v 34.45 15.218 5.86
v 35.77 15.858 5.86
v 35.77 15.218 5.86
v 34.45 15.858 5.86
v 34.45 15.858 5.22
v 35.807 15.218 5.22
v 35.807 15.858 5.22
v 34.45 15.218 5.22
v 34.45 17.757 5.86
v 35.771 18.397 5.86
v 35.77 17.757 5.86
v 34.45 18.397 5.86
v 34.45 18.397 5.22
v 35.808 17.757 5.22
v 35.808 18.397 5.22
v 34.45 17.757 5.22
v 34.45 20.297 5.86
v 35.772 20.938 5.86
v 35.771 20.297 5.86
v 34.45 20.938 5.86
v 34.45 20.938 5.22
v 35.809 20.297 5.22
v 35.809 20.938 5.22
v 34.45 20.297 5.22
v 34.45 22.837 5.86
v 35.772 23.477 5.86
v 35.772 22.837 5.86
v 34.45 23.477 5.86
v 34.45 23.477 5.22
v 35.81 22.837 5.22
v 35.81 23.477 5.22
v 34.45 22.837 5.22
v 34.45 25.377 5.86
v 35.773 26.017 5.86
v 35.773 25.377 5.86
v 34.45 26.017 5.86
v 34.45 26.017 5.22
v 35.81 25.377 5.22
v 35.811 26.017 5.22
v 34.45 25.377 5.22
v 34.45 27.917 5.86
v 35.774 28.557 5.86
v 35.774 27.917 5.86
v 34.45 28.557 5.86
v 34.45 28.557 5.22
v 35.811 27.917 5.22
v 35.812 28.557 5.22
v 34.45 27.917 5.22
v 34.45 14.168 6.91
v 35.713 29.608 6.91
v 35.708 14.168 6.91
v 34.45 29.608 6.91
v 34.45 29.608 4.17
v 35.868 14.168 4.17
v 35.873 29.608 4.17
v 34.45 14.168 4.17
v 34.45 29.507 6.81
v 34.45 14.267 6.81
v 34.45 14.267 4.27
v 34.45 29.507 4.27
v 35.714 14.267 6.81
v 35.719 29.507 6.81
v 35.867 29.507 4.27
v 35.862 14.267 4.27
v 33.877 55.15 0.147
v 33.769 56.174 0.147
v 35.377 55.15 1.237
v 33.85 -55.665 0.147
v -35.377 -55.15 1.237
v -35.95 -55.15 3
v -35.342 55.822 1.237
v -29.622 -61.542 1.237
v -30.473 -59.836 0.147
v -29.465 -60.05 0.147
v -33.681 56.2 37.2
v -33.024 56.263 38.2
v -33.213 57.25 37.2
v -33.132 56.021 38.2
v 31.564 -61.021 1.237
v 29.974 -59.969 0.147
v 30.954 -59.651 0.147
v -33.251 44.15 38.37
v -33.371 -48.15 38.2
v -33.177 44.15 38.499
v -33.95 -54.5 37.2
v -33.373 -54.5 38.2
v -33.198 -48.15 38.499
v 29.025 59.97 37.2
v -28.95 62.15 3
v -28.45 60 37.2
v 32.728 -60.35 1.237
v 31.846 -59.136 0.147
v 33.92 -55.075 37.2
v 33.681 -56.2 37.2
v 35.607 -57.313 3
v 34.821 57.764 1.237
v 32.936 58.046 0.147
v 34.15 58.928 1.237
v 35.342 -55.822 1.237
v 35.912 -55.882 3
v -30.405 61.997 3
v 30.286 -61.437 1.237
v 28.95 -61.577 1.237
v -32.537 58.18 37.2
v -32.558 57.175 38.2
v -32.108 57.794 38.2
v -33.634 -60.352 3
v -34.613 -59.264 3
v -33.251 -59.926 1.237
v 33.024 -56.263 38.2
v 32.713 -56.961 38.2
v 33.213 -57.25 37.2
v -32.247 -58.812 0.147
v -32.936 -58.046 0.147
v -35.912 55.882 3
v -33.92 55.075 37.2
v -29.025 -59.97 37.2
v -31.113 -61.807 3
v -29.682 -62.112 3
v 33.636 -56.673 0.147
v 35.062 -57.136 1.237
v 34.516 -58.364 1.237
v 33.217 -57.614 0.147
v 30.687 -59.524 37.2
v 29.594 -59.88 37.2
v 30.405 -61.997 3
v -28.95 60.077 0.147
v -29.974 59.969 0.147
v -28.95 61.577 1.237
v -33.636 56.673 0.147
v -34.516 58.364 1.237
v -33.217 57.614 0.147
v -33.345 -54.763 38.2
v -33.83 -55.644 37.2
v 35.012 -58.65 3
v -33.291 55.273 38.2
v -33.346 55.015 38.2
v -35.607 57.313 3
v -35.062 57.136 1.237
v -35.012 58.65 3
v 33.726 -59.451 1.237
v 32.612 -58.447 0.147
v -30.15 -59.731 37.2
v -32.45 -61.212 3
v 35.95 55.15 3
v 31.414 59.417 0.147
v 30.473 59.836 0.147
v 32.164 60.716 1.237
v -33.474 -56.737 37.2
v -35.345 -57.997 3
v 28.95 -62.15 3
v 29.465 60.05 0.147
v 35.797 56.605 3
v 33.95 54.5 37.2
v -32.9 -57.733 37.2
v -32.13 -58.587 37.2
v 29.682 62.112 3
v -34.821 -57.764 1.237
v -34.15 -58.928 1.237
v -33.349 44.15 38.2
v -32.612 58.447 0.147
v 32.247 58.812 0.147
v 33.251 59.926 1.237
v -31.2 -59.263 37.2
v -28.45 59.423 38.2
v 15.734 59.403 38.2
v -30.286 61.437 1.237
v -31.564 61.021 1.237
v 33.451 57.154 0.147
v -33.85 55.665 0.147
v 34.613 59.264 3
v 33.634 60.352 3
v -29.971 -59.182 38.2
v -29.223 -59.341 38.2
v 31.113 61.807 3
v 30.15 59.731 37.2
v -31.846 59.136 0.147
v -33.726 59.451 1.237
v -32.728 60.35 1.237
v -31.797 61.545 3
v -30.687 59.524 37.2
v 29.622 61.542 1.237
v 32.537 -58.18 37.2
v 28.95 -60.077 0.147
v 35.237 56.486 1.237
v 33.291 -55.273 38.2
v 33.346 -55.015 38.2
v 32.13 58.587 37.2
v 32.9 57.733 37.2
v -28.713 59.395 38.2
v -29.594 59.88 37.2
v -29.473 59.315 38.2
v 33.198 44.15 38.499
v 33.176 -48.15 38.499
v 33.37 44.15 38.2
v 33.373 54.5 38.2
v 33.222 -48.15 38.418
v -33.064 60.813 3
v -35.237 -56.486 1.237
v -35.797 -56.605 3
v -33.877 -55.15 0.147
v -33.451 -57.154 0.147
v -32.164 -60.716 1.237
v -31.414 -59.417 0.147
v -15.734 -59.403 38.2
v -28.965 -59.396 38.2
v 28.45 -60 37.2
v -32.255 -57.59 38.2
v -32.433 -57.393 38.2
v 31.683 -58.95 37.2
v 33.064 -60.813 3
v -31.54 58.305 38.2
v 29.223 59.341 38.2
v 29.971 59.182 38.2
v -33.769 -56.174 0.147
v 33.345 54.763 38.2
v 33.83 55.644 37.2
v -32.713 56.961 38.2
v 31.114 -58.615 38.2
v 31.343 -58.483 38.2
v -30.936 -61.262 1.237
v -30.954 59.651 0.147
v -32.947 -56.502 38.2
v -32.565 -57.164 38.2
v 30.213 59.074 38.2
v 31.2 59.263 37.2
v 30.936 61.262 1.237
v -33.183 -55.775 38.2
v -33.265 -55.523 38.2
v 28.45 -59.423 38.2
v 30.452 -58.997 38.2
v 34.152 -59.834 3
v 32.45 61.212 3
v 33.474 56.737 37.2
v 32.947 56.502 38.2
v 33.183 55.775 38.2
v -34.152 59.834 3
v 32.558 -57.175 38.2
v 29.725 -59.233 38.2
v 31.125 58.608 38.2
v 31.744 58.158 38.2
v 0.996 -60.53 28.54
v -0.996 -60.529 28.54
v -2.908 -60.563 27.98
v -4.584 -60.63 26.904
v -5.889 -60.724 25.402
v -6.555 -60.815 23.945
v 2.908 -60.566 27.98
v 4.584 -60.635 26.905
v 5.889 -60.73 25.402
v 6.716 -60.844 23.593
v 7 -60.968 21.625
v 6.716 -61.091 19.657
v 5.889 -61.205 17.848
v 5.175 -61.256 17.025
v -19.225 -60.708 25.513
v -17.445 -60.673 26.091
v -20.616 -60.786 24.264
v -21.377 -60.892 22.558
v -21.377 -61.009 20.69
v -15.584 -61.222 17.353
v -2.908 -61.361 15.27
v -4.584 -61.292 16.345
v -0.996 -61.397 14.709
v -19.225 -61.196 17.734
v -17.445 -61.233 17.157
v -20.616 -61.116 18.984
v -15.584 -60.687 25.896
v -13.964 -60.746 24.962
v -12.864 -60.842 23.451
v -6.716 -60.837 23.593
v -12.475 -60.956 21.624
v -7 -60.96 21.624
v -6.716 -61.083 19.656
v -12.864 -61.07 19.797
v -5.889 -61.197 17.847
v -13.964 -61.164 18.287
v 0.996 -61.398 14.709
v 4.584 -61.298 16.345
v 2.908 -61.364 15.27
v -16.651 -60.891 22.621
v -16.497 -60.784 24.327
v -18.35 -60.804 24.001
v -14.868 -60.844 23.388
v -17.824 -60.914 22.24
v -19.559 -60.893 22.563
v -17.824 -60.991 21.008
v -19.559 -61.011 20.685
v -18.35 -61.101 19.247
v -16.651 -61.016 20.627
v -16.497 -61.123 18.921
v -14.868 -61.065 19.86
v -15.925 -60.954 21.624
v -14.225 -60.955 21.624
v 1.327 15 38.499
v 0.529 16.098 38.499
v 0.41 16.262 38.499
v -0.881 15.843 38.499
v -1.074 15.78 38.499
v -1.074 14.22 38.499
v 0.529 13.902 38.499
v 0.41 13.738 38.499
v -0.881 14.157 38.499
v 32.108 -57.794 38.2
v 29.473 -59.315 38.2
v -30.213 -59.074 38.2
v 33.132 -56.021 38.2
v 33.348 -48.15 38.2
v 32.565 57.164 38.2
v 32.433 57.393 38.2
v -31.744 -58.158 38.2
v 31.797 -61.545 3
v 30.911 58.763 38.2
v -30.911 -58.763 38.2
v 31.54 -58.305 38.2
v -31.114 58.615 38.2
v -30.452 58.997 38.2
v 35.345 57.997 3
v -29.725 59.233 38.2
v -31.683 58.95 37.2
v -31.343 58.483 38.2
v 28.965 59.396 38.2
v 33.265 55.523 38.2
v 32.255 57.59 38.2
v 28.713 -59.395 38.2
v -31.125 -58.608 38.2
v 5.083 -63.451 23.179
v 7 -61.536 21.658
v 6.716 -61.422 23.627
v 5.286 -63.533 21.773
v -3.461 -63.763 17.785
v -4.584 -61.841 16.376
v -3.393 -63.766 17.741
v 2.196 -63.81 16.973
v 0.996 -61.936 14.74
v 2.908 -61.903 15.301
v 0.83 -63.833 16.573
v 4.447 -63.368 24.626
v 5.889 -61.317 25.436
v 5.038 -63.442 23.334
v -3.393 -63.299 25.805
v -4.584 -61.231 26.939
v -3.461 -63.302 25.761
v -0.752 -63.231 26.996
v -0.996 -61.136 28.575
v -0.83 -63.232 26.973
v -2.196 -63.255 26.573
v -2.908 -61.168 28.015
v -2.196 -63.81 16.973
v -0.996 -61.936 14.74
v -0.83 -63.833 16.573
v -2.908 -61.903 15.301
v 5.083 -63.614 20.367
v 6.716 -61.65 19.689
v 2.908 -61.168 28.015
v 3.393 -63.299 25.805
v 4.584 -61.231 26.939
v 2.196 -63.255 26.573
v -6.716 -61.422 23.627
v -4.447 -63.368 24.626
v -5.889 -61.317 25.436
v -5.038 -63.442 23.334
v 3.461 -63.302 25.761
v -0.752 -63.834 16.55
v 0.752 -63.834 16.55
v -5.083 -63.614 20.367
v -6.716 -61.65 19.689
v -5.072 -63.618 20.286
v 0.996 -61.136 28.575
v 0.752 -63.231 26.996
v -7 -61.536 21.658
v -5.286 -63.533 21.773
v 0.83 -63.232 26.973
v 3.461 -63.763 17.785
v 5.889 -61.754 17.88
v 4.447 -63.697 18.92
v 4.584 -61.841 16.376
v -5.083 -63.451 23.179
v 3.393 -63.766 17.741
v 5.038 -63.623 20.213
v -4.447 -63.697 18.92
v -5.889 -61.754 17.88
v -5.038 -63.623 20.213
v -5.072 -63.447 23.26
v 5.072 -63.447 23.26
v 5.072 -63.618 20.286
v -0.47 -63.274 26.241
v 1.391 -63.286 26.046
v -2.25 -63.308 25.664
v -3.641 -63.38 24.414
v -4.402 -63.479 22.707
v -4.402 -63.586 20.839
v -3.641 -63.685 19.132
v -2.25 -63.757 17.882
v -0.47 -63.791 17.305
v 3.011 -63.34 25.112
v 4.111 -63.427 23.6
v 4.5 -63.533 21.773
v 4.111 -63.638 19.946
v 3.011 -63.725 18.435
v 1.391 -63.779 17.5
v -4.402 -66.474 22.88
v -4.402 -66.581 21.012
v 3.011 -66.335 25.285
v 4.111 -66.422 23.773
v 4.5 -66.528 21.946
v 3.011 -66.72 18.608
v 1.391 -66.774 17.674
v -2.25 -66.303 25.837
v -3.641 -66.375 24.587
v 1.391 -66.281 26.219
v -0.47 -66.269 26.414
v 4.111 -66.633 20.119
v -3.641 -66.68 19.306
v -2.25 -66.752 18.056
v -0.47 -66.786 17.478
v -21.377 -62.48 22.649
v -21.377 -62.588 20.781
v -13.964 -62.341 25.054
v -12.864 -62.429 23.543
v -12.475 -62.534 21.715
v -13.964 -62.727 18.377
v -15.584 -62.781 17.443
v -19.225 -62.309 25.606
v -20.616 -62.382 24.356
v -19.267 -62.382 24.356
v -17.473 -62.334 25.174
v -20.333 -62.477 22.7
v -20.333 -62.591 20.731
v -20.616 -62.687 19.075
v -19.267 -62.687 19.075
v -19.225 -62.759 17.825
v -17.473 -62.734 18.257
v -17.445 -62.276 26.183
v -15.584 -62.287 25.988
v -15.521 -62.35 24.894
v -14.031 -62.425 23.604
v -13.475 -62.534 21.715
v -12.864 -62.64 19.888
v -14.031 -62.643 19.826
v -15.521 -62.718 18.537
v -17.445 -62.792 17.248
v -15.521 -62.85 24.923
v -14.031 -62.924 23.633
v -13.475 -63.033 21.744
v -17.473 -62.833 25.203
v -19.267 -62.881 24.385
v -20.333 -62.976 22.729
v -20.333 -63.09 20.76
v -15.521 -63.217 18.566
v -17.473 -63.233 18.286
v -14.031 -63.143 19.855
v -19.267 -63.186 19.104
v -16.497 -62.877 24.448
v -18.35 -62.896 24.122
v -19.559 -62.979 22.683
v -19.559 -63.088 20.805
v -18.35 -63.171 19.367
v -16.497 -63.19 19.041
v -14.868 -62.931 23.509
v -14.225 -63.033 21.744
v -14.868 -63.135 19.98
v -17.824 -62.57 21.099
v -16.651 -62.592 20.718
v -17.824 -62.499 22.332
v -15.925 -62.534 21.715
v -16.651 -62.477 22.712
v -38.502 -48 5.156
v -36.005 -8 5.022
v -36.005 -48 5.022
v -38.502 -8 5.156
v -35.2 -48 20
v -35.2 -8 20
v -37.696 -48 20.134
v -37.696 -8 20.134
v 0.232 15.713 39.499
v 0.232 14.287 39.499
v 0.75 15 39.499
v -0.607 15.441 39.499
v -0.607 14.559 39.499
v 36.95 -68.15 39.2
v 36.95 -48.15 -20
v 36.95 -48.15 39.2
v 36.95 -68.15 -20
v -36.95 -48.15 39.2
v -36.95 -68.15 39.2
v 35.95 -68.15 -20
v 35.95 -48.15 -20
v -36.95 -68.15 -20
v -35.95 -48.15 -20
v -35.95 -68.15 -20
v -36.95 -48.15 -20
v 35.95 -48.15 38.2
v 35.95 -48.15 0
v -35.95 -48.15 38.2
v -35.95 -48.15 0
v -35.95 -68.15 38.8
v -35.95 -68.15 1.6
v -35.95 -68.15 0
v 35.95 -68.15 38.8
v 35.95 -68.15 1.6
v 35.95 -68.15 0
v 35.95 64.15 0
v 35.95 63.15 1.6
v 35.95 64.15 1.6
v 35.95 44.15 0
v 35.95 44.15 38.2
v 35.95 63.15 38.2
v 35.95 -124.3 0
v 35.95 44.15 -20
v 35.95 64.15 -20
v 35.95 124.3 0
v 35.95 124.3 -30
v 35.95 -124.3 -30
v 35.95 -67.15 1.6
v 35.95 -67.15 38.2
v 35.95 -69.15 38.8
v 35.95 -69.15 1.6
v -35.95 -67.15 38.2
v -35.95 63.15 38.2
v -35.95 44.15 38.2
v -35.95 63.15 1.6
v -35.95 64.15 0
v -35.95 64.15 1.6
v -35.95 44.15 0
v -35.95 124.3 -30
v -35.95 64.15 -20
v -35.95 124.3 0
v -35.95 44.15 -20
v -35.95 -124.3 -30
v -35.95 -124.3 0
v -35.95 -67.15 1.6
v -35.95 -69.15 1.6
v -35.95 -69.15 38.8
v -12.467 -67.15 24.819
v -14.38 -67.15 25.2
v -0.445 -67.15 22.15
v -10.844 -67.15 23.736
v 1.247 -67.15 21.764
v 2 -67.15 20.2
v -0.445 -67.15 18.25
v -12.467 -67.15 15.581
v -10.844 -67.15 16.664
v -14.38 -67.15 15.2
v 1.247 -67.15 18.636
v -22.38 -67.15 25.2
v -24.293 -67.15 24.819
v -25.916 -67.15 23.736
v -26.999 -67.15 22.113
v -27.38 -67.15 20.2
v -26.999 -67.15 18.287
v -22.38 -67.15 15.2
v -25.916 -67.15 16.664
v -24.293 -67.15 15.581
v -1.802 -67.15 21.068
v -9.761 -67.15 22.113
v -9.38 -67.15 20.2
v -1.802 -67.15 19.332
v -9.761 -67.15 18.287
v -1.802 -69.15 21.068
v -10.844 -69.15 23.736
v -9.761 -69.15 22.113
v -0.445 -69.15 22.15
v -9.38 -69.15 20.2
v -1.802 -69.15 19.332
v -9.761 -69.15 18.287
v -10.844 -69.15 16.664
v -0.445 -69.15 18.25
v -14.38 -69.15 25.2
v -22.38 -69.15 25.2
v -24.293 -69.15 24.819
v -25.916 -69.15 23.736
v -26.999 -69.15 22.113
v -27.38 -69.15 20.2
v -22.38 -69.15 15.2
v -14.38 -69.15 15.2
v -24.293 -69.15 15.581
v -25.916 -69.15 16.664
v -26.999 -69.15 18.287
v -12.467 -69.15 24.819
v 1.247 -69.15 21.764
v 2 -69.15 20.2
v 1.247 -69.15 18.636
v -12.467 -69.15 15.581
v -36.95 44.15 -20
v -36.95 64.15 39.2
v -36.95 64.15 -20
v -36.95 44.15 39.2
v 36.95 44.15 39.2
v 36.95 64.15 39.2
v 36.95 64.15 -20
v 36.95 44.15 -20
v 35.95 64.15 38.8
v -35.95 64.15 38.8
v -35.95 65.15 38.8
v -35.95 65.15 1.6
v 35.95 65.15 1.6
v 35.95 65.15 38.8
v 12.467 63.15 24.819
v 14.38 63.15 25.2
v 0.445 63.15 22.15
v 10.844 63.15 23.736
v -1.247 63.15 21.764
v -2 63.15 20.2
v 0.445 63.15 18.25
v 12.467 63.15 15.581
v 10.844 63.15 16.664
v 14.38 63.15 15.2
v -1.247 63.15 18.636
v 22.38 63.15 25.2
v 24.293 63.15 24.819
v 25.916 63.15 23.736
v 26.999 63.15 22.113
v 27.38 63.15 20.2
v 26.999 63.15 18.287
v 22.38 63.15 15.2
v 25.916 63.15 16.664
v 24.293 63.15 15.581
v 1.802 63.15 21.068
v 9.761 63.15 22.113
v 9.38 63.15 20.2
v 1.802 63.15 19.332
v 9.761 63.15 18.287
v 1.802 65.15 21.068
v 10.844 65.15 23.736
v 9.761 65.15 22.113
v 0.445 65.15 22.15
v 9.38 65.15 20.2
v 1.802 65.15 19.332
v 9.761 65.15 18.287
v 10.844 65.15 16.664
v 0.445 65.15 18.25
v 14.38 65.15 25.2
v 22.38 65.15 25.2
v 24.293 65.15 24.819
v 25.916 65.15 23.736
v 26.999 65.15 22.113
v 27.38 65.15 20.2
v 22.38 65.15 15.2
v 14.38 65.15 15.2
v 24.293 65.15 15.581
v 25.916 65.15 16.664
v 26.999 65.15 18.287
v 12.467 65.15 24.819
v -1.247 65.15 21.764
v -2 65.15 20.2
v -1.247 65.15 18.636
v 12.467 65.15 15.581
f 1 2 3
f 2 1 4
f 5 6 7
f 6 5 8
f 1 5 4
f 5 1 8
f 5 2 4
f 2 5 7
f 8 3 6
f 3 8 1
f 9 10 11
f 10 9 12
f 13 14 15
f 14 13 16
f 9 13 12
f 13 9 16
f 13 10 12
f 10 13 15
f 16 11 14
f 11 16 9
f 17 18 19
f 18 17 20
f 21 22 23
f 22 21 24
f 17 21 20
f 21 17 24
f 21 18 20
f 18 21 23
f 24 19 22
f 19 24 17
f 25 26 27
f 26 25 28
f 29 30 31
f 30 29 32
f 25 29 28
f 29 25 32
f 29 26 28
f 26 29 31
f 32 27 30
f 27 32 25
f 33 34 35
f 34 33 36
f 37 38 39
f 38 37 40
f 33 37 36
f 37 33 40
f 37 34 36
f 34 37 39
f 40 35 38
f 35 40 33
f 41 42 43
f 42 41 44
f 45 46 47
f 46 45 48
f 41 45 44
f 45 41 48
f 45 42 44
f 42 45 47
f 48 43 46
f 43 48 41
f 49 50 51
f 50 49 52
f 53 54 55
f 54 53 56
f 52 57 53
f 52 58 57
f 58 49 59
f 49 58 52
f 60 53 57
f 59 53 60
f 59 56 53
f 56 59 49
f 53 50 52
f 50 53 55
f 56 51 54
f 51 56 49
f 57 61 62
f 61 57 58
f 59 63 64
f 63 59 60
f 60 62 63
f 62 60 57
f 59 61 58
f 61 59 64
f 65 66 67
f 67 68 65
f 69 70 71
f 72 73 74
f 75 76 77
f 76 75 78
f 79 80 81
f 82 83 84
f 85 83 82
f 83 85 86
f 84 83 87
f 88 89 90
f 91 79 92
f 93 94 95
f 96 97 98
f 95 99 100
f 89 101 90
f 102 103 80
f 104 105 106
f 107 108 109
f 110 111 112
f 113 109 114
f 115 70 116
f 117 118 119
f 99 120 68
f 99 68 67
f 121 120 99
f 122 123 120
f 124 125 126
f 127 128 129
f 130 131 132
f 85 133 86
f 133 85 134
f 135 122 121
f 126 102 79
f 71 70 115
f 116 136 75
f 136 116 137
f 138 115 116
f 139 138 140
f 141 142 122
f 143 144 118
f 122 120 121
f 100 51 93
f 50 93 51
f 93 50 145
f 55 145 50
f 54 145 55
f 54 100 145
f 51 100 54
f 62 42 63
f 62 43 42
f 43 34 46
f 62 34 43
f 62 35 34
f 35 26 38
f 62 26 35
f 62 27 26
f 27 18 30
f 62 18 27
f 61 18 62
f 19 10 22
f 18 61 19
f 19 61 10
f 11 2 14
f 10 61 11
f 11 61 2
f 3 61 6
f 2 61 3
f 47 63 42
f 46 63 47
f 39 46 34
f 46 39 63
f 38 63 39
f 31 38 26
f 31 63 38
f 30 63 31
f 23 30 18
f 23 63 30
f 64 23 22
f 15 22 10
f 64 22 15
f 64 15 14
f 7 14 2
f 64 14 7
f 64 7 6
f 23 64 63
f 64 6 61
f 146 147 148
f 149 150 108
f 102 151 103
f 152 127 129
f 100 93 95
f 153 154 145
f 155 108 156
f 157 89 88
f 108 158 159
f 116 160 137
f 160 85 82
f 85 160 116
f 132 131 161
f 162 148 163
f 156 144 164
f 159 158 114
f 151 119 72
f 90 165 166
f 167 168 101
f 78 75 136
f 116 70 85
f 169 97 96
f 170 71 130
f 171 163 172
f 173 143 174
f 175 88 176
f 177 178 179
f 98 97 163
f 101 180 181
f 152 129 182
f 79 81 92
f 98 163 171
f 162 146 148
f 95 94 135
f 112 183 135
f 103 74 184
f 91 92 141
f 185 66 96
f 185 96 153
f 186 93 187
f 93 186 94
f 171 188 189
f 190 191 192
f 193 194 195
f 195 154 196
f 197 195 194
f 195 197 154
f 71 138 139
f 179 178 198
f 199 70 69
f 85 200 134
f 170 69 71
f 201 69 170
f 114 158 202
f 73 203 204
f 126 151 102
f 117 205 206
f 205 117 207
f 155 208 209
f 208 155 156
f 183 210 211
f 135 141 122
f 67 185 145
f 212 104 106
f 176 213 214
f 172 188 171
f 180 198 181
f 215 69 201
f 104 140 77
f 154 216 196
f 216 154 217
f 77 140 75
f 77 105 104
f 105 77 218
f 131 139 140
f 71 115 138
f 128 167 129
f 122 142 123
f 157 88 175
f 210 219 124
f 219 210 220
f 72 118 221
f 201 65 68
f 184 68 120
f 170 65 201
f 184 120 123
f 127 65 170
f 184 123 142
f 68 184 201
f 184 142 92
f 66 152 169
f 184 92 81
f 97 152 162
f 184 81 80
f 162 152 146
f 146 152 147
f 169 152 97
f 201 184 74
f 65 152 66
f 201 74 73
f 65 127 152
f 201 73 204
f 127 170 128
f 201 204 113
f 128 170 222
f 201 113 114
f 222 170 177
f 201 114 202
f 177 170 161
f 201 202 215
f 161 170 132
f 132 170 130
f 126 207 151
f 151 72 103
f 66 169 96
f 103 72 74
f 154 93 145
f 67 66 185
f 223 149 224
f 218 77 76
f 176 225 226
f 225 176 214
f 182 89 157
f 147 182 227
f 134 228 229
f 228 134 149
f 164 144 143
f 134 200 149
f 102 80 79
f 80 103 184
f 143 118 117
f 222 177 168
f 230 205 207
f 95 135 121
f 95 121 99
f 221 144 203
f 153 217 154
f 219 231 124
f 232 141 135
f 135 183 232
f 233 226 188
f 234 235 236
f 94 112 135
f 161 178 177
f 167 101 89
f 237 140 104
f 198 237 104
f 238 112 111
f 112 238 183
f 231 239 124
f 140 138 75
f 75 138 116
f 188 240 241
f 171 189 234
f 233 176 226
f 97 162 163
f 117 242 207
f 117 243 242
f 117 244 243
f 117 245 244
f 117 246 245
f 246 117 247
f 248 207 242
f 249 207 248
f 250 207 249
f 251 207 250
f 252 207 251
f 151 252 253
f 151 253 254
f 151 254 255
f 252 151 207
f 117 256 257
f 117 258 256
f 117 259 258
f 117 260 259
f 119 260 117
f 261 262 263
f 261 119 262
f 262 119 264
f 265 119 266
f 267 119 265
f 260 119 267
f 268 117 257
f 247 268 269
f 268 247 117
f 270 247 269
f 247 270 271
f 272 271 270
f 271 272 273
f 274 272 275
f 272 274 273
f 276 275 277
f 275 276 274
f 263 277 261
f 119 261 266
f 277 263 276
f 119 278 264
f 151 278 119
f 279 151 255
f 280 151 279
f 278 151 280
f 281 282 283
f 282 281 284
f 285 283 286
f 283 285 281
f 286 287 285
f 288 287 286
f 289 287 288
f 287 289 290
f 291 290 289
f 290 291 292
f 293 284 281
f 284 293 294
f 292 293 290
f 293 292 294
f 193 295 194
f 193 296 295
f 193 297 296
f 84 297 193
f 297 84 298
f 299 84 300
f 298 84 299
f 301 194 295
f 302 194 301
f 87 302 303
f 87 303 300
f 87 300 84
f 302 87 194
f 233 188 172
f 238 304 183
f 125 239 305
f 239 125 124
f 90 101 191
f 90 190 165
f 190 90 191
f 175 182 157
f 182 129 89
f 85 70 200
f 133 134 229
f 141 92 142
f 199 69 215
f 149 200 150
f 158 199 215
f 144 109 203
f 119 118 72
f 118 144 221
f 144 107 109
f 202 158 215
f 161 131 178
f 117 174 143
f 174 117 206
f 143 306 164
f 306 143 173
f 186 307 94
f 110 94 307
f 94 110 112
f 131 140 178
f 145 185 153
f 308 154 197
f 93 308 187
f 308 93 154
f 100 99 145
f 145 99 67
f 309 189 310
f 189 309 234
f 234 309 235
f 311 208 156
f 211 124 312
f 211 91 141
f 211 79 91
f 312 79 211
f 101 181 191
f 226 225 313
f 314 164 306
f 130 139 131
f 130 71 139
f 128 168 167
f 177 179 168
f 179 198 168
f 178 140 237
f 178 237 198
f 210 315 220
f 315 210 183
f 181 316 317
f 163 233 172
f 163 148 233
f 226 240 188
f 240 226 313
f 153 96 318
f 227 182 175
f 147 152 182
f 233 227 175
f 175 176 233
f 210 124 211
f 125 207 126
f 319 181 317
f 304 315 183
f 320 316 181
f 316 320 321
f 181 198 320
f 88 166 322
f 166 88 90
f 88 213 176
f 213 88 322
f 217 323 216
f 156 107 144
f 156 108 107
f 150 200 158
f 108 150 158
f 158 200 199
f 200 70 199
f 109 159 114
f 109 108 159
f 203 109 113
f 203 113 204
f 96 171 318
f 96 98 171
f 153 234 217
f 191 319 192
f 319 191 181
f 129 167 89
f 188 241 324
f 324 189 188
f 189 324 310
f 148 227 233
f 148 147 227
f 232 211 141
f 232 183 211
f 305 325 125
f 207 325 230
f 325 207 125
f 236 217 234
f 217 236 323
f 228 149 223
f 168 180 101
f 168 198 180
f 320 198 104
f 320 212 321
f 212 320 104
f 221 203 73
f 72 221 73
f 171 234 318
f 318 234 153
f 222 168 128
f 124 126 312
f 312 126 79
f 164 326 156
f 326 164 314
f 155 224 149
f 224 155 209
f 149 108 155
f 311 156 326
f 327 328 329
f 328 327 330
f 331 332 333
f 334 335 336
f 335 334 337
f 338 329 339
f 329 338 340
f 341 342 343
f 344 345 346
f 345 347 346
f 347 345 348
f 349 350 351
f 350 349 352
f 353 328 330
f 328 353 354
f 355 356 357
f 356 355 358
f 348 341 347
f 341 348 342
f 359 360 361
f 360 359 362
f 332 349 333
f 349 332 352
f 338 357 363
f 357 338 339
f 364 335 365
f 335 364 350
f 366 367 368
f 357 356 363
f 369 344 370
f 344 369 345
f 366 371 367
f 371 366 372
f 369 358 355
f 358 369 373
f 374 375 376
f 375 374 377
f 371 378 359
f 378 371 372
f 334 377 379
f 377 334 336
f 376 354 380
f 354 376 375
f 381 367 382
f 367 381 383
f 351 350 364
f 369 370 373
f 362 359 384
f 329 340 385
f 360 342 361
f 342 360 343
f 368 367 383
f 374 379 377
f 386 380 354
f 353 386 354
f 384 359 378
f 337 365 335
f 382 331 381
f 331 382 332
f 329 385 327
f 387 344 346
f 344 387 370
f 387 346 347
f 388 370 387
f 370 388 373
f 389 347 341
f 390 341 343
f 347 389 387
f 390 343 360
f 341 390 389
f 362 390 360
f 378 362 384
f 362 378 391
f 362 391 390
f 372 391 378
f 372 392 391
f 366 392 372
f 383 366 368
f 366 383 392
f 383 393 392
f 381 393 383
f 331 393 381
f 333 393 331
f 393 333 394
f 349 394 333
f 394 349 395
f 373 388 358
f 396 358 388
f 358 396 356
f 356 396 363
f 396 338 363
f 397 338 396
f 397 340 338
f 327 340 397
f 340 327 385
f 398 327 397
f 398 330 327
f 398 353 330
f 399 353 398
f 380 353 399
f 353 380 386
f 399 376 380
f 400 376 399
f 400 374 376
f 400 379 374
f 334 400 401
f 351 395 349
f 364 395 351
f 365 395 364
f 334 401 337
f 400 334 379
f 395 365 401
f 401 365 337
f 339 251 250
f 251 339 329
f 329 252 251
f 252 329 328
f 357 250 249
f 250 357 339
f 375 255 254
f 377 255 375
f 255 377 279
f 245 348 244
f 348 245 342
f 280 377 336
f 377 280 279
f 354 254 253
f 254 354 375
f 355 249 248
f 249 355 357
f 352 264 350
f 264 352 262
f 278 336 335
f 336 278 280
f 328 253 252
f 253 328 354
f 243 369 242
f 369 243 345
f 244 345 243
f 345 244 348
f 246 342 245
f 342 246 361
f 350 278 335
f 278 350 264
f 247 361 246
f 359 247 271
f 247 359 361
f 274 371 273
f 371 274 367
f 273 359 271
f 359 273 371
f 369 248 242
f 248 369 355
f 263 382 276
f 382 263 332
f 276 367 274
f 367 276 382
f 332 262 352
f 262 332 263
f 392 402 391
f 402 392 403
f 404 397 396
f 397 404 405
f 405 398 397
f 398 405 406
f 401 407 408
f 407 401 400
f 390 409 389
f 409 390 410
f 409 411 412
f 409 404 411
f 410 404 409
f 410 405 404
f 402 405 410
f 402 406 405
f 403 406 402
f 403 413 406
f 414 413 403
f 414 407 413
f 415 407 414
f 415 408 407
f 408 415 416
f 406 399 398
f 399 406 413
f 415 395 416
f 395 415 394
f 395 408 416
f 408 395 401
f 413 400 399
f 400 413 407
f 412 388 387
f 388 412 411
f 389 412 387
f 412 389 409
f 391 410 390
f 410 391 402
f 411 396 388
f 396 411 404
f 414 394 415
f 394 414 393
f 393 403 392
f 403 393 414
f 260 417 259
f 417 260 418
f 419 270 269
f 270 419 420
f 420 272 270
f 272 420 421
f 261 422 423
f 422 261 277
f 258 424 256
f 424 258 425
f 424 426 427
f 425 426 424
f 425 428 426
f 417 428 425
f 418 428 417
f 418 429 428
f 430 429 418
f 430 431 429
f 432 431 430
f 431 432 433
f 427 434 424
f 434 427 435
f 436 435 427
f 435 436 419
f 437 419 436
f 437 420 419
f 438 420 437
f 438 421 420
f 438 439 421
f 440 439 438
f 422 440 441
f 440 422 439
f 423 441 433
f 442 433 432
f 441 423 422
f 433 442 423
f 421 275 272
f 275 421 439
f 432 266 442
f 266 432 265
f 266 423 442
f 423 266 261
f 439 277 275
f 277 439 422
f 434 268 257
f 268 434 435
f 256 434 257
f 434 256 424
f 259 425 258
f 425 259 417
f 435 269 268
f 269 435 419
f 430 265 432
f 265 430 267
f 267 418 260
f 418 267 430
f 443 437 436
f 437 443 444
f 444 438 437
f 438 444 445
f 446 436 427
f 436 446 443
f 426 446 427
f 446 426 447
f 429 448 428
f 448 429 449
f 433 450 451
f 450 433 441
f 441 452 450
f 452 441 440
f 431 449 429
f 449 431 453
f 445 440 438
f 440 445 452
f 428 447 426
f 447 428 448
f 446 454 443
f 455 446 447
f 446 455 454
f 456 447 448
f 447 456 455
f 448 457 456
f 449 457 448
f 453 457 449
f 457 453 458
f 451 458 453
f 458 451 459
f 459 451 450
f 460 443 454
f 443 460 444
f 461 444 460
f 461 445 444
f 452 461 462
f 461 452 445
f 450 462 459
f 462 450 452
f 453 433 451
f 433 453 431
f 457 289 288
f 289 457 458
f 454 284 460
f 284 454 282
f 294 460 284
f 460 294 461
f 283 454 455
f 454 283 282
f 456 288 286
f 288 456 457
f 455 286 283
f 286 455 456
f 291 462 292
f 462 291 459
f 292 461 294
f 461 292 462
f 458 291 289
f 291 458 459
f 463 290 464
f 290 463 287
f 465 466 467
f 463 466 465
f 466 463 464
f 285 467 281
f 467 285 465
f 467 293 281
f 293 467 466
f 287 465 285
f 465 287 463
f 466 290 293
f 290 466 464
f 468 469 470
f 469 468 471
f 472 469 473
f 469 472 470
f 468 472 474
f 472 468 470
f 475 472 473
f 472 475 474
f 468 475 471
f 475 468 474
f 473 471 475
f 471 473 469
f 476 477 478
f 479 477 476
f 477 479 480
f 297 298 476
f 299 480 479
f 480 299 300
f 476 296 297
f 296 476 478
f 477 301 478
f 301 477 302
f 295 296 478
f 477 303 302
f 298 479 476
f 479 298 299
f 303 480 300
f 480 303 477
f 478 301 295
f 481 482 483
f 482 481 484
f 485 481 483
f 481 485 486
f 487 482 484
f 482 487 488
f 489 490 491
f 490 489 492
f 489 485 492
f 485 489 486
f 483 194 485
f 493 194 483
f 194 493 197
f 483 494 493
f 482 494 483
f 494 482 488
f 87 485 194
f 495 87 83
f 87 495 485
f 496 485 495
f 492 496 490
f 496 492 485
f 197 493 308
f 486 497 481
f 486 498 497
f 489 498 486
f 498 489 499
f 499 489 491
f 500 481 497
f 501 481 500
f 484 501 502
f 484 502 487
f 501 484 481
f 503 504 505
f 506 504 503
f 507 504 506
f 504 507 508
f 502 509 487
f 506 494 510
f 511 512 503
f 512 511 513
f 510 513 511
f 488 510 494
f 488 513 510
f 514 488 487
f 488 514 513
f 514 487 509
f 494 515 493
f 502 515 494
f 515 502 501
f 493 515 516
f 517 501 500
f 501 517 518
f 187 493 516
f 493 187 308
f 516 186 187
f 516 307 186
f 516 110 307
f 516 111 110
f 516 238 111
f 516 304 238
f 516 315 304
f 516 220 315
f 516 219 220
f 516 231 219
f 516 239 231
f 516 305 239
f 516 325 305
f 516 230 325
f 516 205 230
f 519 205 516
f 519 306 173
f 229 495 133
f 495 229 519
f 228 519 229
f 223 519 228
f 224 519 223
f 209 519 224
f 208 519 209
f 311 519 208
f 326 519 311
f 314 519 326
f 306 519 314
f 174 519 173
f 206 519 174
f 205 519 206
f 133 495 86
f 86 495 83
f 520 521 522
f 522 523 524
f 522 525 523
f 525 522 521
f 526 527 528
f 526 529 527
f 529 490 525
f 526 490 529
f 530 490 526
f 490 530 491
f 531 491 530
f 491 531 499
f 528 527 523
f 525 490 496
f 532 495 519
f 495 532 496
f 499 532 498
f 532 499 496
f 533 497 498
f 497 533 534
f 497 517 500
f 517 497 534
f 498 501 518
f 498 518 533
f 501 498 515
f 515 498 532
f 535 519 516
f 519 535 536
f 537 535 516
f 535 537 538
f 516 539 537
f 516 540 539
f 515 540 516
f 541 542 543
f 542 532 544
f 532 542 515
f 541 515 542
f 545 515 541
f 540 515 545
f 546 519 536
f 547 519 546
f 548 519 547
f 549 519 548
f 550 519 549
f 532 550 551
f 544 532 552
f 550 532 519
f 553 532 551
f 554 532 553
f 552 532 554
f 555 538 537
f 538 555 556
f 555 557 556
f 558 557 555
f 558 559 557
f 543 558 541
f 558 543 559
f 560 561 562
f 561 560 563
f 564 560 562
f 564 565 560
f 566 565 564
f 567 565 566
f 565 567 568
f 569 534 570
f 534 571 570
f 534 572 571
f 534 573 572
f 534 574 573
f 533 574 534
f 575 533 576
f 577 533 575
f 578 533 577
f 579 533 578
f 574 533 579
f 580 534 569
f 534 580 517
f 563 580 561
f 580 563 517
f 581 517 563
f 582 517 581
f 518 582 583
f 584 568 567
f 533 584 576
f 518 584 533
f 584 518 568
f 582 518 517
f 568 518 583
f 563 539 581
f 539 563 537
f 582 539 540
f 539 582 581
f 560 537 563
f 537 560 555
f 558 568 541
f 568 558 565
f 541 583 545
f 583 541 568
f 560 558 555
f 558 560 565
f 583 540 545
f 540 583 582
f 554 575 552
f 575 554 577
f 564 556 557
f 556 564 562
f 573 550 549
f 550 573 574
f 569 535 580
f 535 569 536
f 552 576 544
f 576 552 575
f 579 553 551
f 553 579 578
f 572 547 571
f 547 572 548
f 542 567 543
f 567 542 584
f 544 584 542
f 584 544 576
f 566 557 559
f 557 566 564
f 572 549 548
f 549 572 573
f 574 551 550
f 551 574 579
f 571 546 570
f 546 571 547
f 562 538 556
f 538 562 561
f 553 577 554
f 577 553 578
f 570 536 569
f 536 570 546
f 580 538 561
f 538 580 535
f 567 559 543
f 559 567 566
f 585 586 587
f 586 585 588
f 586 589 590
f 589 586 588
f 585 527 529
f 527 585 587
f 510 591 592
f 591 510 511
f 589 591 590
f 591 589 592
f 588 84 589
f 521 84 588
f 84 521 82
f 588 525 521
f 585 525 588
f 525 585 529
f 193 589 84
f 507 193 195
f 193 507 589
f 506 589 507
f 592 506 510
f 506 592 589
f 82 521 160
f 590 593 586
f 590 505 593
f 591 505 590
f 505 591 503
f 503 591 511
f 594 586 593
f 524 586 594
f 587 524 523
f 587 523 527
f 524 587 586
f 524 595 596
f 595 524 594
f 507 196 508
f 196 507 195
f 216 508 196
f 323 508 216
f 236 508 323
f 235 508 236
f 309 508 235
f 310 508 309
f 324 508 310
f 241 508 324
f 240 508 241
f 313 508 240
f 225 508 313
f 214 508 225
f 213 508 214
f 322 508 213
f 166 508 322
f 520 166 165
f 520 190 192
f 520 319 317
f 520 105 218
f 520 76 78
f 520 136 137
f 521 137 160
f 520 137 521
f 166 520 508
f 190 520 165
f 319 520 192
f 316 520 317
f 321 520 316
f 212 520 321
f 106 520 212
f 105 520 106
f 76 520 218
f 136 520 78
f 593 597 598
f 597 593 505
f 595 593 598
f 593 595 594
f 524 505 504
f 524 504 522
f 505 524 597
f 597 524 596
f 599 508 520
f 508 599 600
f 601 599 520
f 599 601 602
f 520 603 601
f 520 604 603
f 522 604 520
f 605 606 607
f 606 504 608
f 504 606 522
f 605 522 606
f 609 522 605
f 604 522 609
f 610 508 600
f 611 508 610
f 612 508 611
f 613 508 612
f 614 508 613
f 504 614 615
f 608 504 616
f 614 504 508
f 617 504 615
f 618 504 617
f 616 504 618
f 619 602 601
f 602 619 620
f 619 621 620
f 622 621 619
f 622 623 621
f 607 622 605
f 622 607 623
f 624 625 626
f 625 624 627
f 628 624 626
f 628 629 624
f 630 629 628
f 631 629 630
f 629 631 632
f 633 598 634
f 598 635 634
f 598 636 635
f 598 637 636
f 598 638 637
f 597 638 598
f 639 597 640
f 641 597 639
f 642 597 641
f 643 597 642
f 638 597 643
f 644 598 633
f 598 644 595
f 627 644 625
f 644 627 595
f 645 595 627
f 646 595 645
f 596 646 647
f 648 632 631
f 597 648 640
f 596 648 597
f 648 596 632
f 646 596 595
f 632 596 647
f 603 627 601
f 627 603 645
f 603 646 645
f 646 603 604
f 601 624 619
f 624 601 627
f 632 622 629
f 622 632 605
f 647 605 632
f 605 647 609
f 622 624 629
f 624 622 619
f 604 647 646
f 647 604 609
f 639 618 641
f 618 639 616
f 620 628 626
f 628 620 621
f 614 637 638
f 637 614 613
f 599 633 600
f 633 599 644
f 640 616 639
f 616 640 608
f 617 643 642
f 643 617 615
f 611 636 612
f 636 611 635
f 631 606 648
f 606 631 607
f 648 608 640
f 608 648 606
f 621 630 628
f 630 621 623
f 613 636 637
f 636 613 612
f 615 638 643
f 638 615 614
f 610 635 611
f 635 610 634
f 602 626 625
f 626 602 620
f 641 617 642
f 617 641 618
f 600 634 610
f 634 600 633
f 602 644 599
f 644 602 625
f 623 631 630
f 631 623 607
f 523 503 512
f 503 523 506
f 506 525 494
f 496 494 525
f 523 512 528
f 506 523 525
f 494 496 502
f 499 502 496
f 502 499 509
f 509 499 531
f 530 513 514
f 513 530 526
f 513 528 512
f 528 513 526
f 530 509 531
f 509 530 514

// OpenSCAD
// file: station.scad
// Global resolution
//$fs = 0.1;  // Don't generate smaller facets than 0.1 mm
//$fa = 5;    // Don't generate larger angles than 5 degrees

edge_rounding = 1.5;
corner_radius = 4;

bottom_length = 124.3;
bottom_width = 71.9;
top_length = 120;
top_width = 67.9;
height = 37.2;

module corner(rCorner, rEdge) {
    // One corner of the box: a series of spheres rotated from 0° to 90°
    for (angle = [0 : $fa : 90]) {
        rotate(angle) translate([rCorner, 0, 0]) sphere(rEdge);
    }
}

module semiFace(dx, dy, rCorner, rEdge) {
    // Two corners
    translate([dx, dy, 0]) corner(rCorner, rEdge);
    translate([-dx, dy, 0]) rotate([0, 0, 90]) corner(rCorner, rEdge);
}

module face(length, width, rCorner, rEdge) {
    // Four corners with everything in between them.
    dx = width / 2 - rCorner - rEdge;
    dy = length / 2 - rCorner - rEdge;

    hull() {
        semiFace(dx, dy, rCorner, rEdge);
        rotate([0, 0, 180]) semiFace(dx, dy, rCorner, rEdge);
        //cube([dx + dx, dy + dy, 2 * rEdge], center=true);
    }
}

module box_z77() {
    color("DimGrey", 1.0) {
        hull() {
            face(bottom_length, bottom_width, corner_radius, 2 * edge_rounding);
            translate([0, 0, height - 2 * edge_rounding])
                face(top_length, top_width, corner_radius, edge_rounding);
        }
    }
}

module switch_button() {
    color("DimGrey") {
        // Base
        cylinder(h=1, r=7);
        // Slanted part
        translate([0, 0, 1]) {
            // Sliced cylinder
            difference() {
                cylinder(7, 7);
                translate([0, 0, 2]) cylinder(7, 7);
            }
        }
    }

    // Button
    color("Red") {
        cylinder(h=6, r=4.5);
    }
}

module plug() {
    difference() {
        union() {
            color("DimGrey") {
                cylinder(h=2, r=4.5);
            }
            color("LightGrey") {
                cylinder(h=2.5, r=3.5);
            }
        }
        cylinder(h=4, r=5.5/2);
    }
    color("LightGrey") {
        cylinder(h=2, r=2.1*0.5);
    }
}

module programmator_pin() {
    cube([5, 0.64, 0.64], center=true);
}

module programmator_connector() {
    for (pin = [0 : 1 : 5]) {
        translate([0, pin * 2.54, 0]) programmator_pin();
    }
    translate([0, 2.54 * 2.5, 0]) {
        difference() {
            cube([5, 2.54 * 6 + 0.2, 2.54 + 0.2], center=true);
            cube([5, 2.54 * 6, 2.54], center=true);
        }
    }
}

module battery_indicator() {
    translate([-2.5, 0, 0]) {
        color("Black")
            cube([2.5, 40, 15]);
        color("Red")
            translate([0.45, 8, 7.5]) rotate([0, 90, 0]) circle(4);
        color("Green")
            translate([0.45, 15, 2.5])
            rotate([90, 0, 90])
            polygon(points=[[0, 0], [20, 0], [20, 10]]);
    }
}

front_slope = 0.5 * (bottom_length - top_length) / height;
side_slope = 0.5 * (bottom_width - top_width) / height;

module station() {
    // Elevate slightly to align with z=0
    translate([0, 0, edge_rounding * 2]) {

        // Box with programmator connector
        difference() {
            box_z77();
            translate([bottom_width * 0.5 + 1, bottom_length * 0.125, 2.54]) {
                programmator_connector();
            }
        }

        // Position the button
        translate([0, -(top_length + bottom_length) / 4 + height * 0.25 * front_slope, height / 2]) {
            rotate([90 - atan(front_slope), 0, 0])
                switch_button();
        }

        // Position the plug
        translate([-top_width / 4, -(top_length + bottom_length) / 4 + height * 0.25 * front_slope, height / 2]) {
            rotate([90 - atan(front_slope), 0, 0])
                plug();
        }

        translate([-bottom_width / 2 + 0.75, -top_length / 2 + 3 * corner_radius, 17])
            mirror([0, 0, 1])
            rotate([0, -atan(side_slope), 0])
            battery_indicator();

        // Position the led
        color("Red") {
            translate([0, top_length * 0.125, height - 2]) {
                sphere(1.5);
            }
        }
    }
}

station();
// main file
include <station.scad>

module planck() {
    translate([0, 0, -15])
        cube([bottom_width, bottom_length * 2, 30], center = true);
}

holder_length = 20;
holder_thickness = 2;
holder_depth = 20;

holder_height = height + holder_depth + holder_thickness;

module holder() {
    color("Silver")
        translate([0, 0, holder_height / 2 - holder_depth])
        union() {
            difference() {
                cube([bottom_width + holder_thickness, holder_length, holder_height], center=true);
                cube([bottom_width, holder_length + 10, holder_height - holder_thickness], center=true);
            }
            translate([0, -holder_length * 0.5, holder_height * 0.5 - holder_depth + holder_thickness * 0.5])
                difference() {
                    cube([bottom_width, holder_thickness, height], center=true);
                    translate([0, holder_thickness, 0]) rotate([90, 0, 0]) cylinder(h = holder_thickness * 4, r = 2);
                    translate([-bottom_width * 0.2, holder_thickness, 0]) rotate([90, 0, 0]) {
                        hull() {
                            cylinder(h = holder_thickness * 4, r = 5);
                            translate([-8, 0, 0]) cylinder(h = holder_thickness * 4, r = 5);
                        }
                    }
                }
        }

}

planck();

translate([0, -bottom_length * 0.5 + corner_radius, 0])
    holder();

translate([0, bottom_length * 0.5 - 2 * corner_radius, 0])
    rotate([0, 0, 180]) holder();
